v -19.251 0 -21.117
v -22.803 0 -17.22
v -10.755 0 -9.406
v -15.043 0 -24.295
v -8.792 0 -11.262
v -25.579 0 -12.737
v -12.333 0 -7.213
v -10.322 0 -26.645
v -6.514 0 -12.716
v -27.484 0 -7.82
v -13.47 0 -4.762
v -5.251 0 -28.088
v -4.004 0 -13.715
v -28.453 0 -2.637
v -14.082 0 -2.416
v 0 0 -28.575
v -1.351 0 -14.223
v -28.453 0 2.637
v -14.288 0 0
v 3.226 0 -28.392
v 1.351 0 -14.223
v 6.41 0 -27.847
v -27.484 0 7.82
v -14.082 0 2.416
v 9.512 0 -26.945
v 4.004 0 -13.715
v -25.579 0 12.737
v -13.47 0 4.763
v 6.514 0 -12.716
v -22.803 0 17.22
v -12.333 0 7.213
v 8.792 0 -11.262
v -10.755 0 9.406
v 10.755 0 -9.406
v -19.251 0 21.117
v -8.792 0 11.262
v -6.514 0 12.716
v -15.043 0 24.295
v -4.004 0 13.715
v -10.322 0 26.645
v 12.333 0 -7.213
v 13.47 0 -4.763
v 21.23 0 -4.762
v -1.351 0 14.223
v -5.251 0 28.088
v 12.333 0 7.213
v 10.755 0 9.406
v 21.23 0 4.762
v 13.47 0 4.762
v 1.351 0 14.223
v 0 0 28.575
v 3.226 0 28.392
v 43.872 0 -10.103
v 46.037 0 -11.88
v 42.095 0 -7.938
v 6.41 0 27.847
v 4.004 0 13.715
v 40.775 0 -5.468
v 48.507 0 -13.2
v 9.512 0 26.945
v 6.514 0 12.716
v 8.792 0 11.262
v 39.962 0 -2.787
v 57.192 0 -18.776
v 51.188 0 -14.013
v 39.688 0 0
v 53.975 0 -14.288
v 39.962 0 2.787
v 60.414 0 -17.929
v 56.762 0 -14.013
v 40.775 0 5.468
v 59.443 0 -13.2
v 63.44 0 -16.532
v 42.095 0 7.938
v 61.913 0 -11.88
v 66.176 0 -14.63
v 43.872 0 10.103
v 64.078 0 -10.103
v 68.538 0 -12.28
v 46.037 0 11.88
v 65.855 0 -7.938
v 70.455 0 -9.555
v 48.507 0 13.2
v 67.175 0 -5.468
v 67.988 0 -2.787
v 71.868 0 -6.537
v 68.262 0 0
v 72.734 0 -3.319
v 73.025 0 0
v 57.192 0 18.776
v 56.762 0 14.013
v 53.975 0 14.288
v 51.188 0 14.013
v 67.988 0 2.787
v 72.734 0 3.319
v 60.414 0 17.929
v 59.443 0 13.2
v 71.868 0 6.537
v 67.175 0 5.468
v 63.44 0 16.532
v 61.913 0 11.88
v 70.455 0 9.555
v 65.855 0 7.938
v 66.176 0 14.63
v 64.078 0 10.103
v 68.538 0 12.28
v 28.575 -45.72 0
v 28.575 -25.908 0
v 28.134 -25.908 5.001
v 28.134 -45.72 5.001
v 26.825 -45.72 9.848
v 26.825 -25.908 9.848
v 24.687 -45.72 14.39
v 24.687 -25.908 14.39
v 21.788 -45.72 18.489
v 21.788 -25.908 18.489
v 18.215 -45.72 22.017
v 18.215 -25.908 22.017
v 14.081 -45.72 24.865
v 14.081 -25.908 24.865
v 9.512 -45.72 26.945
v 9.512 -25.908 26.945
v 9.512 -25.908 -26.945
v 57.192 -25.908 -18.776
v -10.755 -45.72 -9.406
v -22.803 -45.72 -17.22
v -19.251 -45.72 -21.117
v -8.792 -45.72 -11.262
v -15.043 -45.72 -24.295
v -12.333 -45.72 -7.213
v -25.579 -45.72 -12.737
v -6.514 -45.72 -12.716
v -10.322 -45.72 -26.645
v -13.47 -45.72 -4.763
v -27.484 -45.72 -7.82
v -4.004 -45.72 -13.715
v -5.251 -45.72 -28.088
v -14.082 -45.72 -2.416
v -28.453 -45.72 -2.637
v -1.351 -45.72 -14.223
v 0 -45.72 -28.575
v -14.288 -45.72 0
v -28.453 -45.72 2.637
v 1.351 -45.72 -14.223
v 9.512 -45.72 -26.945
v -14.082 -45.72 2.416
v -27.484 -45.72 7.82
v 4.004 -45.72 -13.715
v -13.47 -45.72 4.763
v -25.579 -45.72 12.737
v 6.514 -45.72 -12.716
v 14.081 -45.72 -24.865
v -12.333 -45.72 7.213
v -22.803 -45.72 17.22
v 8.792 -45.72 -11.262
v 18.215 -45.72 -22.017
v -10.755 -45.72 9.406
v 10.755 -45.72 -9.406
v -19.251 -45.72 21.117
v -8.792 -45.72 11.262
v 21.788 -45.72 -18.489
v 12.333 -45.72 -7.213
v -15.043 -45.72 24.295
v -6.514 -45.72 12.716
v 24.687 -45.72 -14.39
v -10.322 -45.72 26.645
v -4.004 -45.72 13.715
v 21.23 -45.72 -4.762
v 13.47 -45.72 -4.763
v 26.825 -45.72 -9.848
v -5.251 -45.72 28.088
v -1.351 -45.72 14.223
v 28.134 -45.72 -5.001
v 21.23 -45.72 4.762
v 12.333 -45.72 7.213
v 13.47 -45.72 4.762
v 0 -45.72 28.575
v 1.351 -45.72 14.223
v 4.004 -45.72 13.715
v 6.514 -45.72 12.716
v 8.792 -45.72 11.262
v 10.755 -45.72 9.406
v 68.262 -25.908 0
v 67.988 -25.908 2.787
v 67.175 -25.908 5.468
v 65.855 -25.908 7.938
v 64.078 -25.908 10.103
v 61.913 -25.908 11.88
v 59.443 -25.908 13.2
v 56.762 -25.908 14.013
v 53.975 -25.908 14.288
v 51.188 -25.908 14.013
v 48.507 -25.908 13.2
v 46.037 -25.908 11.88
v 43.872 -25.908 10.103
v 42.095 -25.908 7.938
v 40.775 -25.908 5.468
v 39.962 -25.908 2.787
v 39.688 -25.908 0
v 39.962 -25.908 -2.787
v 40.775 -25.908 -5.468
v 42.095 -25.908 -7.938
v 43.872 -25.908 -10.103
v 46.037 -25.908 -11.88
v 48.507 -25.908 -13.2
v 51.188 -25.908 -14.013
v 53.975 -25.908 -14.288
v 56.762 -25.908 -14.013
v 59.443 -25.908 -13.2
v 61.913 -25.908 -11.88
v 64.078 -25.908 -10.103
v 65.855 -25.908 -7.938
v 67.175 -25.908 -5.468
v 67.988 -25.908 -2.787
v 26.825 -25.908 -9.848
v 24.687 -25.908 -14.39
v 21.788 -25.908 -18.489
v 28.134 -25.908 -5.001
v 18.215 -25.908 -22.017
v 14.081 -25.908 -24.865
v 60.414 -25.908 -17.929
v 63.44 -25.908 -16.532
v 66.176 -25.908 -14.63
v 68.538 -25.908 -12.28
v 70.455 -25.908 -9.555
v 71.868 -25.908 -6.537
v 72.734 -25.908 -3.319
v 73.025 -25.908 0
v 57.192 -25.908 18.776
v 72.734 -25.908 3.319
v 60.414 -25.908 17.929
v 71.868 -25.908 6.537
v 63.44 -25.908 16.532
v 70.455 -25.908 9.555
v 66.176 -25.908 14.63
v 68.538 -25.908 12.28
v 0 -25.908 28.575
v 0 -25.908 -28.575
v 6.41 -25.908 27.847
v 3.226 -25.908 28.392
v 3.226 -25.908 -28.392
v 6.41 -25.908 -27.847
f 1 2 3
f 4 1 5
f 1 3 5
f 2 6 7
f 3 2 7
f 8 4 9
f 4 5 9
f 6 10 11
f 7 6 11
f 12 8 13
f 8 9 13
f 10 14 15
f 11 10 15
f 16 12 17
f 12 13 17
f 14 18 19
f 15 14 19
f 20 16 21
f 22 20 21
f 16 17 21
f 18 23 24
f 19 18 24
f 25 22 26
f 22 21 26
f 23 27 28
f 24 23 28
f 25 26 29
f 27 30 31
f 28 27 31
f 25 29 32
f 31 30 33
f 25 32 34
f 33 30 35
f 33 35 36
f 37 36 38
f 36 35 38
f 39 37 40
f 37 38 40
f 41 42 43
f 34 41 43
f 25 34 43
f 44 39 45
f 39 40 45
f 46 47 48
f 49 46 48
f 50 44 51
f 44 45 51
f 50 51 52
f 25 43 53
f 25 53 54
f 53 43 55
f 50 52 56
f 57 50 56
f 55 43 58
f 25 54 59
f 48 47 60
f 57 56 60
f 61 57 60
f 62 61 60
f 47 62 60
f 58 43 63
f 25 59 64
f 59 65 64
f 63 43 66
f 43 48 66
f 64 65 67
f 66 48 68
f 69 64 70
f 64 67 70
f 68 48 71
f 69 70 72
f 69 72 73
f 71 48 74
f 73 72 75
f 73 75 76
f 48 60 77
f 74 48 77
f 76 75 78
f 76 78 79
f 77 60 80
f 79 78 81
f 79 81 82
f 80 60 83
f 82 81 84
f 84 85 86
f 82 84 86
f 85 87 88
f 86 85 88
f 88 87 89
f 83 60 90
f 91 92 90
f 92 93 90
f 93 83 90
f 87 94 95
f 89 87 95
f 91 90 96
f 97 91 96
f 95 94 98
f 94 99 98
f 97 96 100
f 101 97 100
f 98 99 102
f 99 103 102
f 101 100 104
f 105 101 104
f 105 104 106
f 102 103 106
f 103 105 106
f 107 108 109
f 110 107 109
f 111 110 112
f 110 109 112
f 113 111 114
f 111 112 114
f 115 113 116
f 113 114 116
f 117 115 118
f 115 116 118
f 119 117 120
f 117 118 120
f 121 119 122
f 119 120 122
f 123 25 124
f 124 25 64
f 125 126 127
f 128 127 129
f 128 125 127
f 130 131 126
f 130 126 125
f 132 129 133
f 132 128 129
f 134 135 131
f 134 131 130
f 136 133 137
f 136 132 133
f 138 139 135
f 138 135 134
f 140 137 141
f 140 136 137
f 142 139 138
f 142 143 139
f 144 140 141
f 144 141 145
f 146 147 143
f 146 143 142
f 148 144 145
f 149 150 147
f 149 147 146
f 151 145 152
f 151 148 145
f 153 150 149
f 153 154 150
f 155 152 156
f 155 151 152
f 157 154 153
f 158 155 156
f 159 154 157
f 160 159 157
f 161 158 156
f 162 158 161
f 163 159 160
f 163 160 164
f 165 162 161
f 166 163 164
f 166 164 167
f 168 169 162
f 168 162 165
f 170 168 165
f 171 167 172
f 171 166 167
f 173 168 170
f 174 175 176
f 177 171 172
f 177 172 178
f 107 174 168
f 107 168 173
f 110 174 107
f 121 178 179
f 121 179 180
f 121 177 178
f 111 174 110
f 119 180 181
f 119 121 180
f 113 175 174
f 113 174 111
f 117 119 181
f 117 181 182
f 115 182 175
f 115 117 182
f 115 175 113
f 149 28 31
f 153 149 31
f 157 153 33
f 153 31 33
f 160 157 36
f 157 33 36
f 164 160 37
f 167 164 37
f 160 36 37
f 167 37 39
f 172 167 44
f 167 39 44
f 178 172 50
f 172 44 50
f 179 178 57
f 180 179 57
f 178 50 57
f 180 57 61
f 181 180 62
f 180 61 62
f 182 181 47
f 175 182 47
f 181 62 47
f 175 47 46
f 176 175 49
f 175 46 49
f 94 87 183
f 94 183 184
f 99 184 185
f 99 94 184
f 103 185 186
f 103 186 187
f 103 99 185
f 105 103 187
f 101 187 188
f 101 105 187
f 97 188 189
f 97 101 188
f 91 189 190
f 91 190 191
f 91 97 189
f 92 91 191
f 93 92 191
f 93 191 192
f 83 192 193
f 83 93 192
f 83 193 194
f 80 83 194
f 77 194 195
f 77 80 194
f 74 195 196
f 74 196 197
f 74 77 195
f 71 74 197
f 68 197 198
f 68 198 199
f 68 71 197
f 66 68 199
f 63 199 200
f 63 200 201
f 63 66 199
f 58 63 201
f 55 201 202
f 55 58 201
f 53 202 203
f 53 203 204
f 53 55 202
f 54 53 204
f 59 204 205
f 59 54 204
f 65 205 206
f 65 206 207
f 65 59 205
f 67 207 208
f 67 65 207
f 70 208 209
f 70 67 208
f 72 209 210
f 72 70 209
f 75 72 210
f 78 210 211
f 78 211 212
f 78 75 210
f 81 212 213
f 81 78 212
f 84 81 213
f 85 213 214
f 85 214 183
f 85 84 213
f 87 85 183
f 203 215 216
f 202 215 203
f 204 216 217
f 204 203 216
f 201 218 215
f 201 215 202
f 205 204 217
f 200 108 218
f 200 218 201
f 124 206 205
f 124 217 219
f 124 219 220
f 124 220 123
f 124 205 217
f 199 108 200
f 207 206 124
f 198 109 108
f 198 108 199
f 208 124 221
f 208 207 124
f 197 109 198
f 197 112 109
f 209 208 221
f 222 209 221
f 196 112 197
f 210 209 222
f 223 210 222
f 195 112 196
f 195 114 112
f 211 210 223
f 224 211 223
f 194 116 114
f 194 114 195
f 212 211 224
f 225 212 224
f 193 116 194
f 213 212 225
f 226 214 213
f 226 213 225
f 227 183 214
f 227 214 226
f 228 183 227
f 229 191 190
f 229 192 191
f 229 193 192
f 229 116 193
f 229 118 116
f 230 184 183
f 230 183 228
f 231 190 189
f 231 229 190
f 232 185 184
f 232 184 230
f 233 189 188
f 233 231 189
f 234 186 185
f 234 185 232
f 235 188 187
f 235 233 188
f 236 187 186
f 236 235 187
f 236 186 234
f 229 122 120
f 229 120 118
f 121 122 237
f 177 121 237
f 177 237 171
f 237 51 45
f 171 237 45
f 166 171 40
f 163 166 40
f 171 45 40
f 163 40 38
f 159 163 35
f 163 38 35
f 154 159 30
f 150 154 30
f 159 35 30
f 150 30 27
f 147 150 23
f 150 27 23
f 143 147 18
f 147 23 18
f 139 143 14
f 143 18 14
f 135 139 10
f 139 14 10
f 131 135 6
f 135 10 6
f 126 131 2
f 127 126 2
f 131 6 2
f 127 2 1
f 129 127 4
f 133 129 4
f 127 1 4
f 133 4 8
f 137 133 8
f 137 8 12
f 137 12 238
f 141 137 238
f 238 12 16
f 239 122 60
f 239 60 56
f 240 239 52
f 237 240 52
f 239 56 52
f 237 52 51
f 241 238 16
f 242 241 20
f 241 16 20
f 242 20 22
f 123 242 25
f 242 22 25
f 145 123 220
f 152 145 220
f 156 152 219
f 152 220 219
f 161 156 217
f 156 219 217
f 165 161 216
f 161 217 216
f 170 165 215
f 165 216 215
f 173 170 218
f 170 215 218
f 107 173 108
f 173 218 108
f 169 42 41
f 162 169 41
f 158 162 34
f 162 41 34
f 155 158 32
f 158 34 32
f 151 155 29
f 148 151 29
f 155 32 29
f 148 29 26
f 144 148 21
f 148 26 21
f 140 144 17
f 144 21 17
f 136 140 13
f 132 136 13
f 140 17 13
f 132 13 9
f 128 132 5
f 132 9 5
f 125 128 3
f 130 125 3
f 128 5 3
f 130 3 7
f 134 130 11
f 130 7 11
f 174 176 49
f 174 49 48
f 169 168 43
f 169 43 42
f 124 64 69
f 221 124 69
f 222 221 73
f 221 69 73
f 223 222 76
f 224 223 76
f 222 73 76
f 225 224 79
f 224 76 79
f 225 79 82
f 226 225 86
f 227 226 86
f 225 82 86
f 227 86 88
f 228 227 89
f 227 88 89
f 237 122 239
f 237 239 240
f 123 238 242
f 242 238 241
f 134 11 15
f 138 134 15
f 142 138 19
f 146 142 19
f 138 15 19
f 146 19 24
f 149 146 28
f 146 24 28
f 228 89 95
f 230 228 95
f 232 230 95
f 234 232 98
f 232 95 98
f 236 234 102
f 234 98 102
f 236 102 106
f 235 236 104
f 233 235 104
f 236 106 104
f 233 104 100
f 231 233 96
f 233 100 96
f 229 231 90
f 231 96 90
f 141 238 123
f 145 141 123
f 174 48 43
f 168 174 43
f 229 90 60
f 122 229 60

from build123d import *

# Parameters (mm, degrees)
F1_DEPTH = 45.72
F0_R     = 14.2875
F2_DEPTH = 25.908


with BuildPart() as f1:
    # F0 (on Front) → F1 (new body)
    with BuildSketch(Plane.XZ):
        with BuildLine():
            Line((9.5121844836, 26.9452959039), (0, 28.575))
            ThreePointArc((0, 28.575), (-28.575, 0), (0, -28.575))
            Line((0, -28.575), (9.5121844836, -26.9452959039))
            ThreePointArc((9.5121844836, -26.9452959039), (23.3274655355, -16.5033322905), (28.575, 0))
            ThreePointArc((28.575, 0), (23.3274655355, 16.5033322905), (9.5121844836, 26.9452959039))
        make_face()
        with BuildLine():
            ThreePointArc((-13.4703841816, 4.7625), (0, 14.2875), (13.4703841816, 4.7625))
            Line((13.4703841816, 4.7625), (21.229936273, 4.7625))
            Line((21.229936273, 4.7625), (21.229936273, -4.7625))
            Line((21.229936273, -4.7625), (13.4703841816, -4.7625))
            ThreePointArc((13.4703841816, -4.7625), (0, -14.2875), (-13.4703841816, -4.7625))
            Line((-13.4703841816, -4.7625), (-16.870063727, -4.7625))
            Line((-16.870063727, -4.7625), (-16.870063727, 4.7625))
            Line((-16.870063727, 4.7625), (-13.4703841816, 4.7625))
        make_face(mode=Mode.SUBTRACT)
        with BuildLine():
            ThreePointArc((-13.4703841816, -4.7625), (-14.2875, 0), (-13.4703841816, 4.7625))
            Line((-13.4703841816, 4.7625), (-16.870063727, 4.7625))
            Line((-16.870063727, 4.7625), (-16.870063727, -4.7625))
            Line((-16.870063727, -4.7625), (-13.4703841816, -4.7625))
        make_face()
    extrude(amount=F1_DEPTH)

    # F0 (on Front) → F2 (join)
    with BuildSketch(Plane.XZ):
        with BuildLine():
            Line((9.5121844836, 26.9452959039), (0, 28.575))
            ThreePointArc((0, 28.575), (-28.575, 0), (0, -28.575))
            Line((0, -28.575), (9.5121844836, -26.9452959039))
            ThreePointArc((9.5121844836, -26.9452959039), (23.3274655355, -16.5033322905), (28.575, 0))
            ThreePointArc((28.575, 0), (23.3274655355, 16.5033322905), (9.5121844836, 26.9452959039))
        make_face()
        with BuildLine():
            ThreePointArc((-13.4703841816, 4.7625), (0, 14.2875), (13.4703841816, 4.7625))
            Line((13.4703841816, 4.7625), (21.229936273, 4.7625))
            Line((21.229936273, 4.7625), (21.229936273, -4.7625))
            Line((21.229936273, -4.7625), (13.4703841816, -4.7625))
            ThreePointArc((13.4703841816, -4.7625), (0, -14.2875), (-13.4703841816, -4.7625))
            Line((-13.4703841816, -4.7625), (-16.870063727, -4.7625))
            Line((-16.870063727, -4.7625), (-16.870063727, 4.7625))
            Line((-16.870063727, 4.7625), (-13.4703841816, 4.7625))
        make_face(mode=Mode.SUBTRACT)
        with BuildLine():
            ThreePointArc((9.5121844836, 26.9452959039), (4.8253908933, 28.1646272428), (0, 28.575))
            Line((0, 28.575), (9.5121844836, 26.9452959039))
        make_face()
        with BuildLine():
            Line((9.5121844836, -26.9452959039), (0, -28.575))
            ThreePointArc((0, -28.575), (4.8253908933, -28.1646272428), (9.5121844836, -26.9452959039))
        make_face()
        with BuildLine():
            Line((57.1919272622, 18.7764181619), (9.5121844836, 26.9452959039))
            ThreePointArc((9.5121844836, 26.9452959039), (23.3274655355, 16.5033322905), (28.575, 0))
            ThreePointArc((28.575, 0), (23.3274655355, -16.5033322905), (9.5121844836, -26.9452959039))
            Line((9.5121844836, -26.9452959039), (57.1919272622, -18.7764181619))
            ThreePointArc((57.1919272622, -18.7764181619), (34.925, 0), (57.1919272622, 18.7764181619))
        make_face()
        with BuildLine():
            ThreePointArc((73.025, 0), (68.5383952831, 12.2804730295), (57.1919272622, 18.7764181619))
            ThreePointArc((57.1919272622, 18.7764181619), (34.925, 0), (57.1919272622, -18.7764181619))
            ThreePointArc((57.1919272622, -18.7764181619), (68.5383952831, -12.2804730295), (73.025, 0))
        make_face()
        with Locations((53.975, 0)):
            Circle(F0_R, mode=Mode.SUBTRACT)
    extrude(amount=F2_DEPTH)


solid = f1.part
